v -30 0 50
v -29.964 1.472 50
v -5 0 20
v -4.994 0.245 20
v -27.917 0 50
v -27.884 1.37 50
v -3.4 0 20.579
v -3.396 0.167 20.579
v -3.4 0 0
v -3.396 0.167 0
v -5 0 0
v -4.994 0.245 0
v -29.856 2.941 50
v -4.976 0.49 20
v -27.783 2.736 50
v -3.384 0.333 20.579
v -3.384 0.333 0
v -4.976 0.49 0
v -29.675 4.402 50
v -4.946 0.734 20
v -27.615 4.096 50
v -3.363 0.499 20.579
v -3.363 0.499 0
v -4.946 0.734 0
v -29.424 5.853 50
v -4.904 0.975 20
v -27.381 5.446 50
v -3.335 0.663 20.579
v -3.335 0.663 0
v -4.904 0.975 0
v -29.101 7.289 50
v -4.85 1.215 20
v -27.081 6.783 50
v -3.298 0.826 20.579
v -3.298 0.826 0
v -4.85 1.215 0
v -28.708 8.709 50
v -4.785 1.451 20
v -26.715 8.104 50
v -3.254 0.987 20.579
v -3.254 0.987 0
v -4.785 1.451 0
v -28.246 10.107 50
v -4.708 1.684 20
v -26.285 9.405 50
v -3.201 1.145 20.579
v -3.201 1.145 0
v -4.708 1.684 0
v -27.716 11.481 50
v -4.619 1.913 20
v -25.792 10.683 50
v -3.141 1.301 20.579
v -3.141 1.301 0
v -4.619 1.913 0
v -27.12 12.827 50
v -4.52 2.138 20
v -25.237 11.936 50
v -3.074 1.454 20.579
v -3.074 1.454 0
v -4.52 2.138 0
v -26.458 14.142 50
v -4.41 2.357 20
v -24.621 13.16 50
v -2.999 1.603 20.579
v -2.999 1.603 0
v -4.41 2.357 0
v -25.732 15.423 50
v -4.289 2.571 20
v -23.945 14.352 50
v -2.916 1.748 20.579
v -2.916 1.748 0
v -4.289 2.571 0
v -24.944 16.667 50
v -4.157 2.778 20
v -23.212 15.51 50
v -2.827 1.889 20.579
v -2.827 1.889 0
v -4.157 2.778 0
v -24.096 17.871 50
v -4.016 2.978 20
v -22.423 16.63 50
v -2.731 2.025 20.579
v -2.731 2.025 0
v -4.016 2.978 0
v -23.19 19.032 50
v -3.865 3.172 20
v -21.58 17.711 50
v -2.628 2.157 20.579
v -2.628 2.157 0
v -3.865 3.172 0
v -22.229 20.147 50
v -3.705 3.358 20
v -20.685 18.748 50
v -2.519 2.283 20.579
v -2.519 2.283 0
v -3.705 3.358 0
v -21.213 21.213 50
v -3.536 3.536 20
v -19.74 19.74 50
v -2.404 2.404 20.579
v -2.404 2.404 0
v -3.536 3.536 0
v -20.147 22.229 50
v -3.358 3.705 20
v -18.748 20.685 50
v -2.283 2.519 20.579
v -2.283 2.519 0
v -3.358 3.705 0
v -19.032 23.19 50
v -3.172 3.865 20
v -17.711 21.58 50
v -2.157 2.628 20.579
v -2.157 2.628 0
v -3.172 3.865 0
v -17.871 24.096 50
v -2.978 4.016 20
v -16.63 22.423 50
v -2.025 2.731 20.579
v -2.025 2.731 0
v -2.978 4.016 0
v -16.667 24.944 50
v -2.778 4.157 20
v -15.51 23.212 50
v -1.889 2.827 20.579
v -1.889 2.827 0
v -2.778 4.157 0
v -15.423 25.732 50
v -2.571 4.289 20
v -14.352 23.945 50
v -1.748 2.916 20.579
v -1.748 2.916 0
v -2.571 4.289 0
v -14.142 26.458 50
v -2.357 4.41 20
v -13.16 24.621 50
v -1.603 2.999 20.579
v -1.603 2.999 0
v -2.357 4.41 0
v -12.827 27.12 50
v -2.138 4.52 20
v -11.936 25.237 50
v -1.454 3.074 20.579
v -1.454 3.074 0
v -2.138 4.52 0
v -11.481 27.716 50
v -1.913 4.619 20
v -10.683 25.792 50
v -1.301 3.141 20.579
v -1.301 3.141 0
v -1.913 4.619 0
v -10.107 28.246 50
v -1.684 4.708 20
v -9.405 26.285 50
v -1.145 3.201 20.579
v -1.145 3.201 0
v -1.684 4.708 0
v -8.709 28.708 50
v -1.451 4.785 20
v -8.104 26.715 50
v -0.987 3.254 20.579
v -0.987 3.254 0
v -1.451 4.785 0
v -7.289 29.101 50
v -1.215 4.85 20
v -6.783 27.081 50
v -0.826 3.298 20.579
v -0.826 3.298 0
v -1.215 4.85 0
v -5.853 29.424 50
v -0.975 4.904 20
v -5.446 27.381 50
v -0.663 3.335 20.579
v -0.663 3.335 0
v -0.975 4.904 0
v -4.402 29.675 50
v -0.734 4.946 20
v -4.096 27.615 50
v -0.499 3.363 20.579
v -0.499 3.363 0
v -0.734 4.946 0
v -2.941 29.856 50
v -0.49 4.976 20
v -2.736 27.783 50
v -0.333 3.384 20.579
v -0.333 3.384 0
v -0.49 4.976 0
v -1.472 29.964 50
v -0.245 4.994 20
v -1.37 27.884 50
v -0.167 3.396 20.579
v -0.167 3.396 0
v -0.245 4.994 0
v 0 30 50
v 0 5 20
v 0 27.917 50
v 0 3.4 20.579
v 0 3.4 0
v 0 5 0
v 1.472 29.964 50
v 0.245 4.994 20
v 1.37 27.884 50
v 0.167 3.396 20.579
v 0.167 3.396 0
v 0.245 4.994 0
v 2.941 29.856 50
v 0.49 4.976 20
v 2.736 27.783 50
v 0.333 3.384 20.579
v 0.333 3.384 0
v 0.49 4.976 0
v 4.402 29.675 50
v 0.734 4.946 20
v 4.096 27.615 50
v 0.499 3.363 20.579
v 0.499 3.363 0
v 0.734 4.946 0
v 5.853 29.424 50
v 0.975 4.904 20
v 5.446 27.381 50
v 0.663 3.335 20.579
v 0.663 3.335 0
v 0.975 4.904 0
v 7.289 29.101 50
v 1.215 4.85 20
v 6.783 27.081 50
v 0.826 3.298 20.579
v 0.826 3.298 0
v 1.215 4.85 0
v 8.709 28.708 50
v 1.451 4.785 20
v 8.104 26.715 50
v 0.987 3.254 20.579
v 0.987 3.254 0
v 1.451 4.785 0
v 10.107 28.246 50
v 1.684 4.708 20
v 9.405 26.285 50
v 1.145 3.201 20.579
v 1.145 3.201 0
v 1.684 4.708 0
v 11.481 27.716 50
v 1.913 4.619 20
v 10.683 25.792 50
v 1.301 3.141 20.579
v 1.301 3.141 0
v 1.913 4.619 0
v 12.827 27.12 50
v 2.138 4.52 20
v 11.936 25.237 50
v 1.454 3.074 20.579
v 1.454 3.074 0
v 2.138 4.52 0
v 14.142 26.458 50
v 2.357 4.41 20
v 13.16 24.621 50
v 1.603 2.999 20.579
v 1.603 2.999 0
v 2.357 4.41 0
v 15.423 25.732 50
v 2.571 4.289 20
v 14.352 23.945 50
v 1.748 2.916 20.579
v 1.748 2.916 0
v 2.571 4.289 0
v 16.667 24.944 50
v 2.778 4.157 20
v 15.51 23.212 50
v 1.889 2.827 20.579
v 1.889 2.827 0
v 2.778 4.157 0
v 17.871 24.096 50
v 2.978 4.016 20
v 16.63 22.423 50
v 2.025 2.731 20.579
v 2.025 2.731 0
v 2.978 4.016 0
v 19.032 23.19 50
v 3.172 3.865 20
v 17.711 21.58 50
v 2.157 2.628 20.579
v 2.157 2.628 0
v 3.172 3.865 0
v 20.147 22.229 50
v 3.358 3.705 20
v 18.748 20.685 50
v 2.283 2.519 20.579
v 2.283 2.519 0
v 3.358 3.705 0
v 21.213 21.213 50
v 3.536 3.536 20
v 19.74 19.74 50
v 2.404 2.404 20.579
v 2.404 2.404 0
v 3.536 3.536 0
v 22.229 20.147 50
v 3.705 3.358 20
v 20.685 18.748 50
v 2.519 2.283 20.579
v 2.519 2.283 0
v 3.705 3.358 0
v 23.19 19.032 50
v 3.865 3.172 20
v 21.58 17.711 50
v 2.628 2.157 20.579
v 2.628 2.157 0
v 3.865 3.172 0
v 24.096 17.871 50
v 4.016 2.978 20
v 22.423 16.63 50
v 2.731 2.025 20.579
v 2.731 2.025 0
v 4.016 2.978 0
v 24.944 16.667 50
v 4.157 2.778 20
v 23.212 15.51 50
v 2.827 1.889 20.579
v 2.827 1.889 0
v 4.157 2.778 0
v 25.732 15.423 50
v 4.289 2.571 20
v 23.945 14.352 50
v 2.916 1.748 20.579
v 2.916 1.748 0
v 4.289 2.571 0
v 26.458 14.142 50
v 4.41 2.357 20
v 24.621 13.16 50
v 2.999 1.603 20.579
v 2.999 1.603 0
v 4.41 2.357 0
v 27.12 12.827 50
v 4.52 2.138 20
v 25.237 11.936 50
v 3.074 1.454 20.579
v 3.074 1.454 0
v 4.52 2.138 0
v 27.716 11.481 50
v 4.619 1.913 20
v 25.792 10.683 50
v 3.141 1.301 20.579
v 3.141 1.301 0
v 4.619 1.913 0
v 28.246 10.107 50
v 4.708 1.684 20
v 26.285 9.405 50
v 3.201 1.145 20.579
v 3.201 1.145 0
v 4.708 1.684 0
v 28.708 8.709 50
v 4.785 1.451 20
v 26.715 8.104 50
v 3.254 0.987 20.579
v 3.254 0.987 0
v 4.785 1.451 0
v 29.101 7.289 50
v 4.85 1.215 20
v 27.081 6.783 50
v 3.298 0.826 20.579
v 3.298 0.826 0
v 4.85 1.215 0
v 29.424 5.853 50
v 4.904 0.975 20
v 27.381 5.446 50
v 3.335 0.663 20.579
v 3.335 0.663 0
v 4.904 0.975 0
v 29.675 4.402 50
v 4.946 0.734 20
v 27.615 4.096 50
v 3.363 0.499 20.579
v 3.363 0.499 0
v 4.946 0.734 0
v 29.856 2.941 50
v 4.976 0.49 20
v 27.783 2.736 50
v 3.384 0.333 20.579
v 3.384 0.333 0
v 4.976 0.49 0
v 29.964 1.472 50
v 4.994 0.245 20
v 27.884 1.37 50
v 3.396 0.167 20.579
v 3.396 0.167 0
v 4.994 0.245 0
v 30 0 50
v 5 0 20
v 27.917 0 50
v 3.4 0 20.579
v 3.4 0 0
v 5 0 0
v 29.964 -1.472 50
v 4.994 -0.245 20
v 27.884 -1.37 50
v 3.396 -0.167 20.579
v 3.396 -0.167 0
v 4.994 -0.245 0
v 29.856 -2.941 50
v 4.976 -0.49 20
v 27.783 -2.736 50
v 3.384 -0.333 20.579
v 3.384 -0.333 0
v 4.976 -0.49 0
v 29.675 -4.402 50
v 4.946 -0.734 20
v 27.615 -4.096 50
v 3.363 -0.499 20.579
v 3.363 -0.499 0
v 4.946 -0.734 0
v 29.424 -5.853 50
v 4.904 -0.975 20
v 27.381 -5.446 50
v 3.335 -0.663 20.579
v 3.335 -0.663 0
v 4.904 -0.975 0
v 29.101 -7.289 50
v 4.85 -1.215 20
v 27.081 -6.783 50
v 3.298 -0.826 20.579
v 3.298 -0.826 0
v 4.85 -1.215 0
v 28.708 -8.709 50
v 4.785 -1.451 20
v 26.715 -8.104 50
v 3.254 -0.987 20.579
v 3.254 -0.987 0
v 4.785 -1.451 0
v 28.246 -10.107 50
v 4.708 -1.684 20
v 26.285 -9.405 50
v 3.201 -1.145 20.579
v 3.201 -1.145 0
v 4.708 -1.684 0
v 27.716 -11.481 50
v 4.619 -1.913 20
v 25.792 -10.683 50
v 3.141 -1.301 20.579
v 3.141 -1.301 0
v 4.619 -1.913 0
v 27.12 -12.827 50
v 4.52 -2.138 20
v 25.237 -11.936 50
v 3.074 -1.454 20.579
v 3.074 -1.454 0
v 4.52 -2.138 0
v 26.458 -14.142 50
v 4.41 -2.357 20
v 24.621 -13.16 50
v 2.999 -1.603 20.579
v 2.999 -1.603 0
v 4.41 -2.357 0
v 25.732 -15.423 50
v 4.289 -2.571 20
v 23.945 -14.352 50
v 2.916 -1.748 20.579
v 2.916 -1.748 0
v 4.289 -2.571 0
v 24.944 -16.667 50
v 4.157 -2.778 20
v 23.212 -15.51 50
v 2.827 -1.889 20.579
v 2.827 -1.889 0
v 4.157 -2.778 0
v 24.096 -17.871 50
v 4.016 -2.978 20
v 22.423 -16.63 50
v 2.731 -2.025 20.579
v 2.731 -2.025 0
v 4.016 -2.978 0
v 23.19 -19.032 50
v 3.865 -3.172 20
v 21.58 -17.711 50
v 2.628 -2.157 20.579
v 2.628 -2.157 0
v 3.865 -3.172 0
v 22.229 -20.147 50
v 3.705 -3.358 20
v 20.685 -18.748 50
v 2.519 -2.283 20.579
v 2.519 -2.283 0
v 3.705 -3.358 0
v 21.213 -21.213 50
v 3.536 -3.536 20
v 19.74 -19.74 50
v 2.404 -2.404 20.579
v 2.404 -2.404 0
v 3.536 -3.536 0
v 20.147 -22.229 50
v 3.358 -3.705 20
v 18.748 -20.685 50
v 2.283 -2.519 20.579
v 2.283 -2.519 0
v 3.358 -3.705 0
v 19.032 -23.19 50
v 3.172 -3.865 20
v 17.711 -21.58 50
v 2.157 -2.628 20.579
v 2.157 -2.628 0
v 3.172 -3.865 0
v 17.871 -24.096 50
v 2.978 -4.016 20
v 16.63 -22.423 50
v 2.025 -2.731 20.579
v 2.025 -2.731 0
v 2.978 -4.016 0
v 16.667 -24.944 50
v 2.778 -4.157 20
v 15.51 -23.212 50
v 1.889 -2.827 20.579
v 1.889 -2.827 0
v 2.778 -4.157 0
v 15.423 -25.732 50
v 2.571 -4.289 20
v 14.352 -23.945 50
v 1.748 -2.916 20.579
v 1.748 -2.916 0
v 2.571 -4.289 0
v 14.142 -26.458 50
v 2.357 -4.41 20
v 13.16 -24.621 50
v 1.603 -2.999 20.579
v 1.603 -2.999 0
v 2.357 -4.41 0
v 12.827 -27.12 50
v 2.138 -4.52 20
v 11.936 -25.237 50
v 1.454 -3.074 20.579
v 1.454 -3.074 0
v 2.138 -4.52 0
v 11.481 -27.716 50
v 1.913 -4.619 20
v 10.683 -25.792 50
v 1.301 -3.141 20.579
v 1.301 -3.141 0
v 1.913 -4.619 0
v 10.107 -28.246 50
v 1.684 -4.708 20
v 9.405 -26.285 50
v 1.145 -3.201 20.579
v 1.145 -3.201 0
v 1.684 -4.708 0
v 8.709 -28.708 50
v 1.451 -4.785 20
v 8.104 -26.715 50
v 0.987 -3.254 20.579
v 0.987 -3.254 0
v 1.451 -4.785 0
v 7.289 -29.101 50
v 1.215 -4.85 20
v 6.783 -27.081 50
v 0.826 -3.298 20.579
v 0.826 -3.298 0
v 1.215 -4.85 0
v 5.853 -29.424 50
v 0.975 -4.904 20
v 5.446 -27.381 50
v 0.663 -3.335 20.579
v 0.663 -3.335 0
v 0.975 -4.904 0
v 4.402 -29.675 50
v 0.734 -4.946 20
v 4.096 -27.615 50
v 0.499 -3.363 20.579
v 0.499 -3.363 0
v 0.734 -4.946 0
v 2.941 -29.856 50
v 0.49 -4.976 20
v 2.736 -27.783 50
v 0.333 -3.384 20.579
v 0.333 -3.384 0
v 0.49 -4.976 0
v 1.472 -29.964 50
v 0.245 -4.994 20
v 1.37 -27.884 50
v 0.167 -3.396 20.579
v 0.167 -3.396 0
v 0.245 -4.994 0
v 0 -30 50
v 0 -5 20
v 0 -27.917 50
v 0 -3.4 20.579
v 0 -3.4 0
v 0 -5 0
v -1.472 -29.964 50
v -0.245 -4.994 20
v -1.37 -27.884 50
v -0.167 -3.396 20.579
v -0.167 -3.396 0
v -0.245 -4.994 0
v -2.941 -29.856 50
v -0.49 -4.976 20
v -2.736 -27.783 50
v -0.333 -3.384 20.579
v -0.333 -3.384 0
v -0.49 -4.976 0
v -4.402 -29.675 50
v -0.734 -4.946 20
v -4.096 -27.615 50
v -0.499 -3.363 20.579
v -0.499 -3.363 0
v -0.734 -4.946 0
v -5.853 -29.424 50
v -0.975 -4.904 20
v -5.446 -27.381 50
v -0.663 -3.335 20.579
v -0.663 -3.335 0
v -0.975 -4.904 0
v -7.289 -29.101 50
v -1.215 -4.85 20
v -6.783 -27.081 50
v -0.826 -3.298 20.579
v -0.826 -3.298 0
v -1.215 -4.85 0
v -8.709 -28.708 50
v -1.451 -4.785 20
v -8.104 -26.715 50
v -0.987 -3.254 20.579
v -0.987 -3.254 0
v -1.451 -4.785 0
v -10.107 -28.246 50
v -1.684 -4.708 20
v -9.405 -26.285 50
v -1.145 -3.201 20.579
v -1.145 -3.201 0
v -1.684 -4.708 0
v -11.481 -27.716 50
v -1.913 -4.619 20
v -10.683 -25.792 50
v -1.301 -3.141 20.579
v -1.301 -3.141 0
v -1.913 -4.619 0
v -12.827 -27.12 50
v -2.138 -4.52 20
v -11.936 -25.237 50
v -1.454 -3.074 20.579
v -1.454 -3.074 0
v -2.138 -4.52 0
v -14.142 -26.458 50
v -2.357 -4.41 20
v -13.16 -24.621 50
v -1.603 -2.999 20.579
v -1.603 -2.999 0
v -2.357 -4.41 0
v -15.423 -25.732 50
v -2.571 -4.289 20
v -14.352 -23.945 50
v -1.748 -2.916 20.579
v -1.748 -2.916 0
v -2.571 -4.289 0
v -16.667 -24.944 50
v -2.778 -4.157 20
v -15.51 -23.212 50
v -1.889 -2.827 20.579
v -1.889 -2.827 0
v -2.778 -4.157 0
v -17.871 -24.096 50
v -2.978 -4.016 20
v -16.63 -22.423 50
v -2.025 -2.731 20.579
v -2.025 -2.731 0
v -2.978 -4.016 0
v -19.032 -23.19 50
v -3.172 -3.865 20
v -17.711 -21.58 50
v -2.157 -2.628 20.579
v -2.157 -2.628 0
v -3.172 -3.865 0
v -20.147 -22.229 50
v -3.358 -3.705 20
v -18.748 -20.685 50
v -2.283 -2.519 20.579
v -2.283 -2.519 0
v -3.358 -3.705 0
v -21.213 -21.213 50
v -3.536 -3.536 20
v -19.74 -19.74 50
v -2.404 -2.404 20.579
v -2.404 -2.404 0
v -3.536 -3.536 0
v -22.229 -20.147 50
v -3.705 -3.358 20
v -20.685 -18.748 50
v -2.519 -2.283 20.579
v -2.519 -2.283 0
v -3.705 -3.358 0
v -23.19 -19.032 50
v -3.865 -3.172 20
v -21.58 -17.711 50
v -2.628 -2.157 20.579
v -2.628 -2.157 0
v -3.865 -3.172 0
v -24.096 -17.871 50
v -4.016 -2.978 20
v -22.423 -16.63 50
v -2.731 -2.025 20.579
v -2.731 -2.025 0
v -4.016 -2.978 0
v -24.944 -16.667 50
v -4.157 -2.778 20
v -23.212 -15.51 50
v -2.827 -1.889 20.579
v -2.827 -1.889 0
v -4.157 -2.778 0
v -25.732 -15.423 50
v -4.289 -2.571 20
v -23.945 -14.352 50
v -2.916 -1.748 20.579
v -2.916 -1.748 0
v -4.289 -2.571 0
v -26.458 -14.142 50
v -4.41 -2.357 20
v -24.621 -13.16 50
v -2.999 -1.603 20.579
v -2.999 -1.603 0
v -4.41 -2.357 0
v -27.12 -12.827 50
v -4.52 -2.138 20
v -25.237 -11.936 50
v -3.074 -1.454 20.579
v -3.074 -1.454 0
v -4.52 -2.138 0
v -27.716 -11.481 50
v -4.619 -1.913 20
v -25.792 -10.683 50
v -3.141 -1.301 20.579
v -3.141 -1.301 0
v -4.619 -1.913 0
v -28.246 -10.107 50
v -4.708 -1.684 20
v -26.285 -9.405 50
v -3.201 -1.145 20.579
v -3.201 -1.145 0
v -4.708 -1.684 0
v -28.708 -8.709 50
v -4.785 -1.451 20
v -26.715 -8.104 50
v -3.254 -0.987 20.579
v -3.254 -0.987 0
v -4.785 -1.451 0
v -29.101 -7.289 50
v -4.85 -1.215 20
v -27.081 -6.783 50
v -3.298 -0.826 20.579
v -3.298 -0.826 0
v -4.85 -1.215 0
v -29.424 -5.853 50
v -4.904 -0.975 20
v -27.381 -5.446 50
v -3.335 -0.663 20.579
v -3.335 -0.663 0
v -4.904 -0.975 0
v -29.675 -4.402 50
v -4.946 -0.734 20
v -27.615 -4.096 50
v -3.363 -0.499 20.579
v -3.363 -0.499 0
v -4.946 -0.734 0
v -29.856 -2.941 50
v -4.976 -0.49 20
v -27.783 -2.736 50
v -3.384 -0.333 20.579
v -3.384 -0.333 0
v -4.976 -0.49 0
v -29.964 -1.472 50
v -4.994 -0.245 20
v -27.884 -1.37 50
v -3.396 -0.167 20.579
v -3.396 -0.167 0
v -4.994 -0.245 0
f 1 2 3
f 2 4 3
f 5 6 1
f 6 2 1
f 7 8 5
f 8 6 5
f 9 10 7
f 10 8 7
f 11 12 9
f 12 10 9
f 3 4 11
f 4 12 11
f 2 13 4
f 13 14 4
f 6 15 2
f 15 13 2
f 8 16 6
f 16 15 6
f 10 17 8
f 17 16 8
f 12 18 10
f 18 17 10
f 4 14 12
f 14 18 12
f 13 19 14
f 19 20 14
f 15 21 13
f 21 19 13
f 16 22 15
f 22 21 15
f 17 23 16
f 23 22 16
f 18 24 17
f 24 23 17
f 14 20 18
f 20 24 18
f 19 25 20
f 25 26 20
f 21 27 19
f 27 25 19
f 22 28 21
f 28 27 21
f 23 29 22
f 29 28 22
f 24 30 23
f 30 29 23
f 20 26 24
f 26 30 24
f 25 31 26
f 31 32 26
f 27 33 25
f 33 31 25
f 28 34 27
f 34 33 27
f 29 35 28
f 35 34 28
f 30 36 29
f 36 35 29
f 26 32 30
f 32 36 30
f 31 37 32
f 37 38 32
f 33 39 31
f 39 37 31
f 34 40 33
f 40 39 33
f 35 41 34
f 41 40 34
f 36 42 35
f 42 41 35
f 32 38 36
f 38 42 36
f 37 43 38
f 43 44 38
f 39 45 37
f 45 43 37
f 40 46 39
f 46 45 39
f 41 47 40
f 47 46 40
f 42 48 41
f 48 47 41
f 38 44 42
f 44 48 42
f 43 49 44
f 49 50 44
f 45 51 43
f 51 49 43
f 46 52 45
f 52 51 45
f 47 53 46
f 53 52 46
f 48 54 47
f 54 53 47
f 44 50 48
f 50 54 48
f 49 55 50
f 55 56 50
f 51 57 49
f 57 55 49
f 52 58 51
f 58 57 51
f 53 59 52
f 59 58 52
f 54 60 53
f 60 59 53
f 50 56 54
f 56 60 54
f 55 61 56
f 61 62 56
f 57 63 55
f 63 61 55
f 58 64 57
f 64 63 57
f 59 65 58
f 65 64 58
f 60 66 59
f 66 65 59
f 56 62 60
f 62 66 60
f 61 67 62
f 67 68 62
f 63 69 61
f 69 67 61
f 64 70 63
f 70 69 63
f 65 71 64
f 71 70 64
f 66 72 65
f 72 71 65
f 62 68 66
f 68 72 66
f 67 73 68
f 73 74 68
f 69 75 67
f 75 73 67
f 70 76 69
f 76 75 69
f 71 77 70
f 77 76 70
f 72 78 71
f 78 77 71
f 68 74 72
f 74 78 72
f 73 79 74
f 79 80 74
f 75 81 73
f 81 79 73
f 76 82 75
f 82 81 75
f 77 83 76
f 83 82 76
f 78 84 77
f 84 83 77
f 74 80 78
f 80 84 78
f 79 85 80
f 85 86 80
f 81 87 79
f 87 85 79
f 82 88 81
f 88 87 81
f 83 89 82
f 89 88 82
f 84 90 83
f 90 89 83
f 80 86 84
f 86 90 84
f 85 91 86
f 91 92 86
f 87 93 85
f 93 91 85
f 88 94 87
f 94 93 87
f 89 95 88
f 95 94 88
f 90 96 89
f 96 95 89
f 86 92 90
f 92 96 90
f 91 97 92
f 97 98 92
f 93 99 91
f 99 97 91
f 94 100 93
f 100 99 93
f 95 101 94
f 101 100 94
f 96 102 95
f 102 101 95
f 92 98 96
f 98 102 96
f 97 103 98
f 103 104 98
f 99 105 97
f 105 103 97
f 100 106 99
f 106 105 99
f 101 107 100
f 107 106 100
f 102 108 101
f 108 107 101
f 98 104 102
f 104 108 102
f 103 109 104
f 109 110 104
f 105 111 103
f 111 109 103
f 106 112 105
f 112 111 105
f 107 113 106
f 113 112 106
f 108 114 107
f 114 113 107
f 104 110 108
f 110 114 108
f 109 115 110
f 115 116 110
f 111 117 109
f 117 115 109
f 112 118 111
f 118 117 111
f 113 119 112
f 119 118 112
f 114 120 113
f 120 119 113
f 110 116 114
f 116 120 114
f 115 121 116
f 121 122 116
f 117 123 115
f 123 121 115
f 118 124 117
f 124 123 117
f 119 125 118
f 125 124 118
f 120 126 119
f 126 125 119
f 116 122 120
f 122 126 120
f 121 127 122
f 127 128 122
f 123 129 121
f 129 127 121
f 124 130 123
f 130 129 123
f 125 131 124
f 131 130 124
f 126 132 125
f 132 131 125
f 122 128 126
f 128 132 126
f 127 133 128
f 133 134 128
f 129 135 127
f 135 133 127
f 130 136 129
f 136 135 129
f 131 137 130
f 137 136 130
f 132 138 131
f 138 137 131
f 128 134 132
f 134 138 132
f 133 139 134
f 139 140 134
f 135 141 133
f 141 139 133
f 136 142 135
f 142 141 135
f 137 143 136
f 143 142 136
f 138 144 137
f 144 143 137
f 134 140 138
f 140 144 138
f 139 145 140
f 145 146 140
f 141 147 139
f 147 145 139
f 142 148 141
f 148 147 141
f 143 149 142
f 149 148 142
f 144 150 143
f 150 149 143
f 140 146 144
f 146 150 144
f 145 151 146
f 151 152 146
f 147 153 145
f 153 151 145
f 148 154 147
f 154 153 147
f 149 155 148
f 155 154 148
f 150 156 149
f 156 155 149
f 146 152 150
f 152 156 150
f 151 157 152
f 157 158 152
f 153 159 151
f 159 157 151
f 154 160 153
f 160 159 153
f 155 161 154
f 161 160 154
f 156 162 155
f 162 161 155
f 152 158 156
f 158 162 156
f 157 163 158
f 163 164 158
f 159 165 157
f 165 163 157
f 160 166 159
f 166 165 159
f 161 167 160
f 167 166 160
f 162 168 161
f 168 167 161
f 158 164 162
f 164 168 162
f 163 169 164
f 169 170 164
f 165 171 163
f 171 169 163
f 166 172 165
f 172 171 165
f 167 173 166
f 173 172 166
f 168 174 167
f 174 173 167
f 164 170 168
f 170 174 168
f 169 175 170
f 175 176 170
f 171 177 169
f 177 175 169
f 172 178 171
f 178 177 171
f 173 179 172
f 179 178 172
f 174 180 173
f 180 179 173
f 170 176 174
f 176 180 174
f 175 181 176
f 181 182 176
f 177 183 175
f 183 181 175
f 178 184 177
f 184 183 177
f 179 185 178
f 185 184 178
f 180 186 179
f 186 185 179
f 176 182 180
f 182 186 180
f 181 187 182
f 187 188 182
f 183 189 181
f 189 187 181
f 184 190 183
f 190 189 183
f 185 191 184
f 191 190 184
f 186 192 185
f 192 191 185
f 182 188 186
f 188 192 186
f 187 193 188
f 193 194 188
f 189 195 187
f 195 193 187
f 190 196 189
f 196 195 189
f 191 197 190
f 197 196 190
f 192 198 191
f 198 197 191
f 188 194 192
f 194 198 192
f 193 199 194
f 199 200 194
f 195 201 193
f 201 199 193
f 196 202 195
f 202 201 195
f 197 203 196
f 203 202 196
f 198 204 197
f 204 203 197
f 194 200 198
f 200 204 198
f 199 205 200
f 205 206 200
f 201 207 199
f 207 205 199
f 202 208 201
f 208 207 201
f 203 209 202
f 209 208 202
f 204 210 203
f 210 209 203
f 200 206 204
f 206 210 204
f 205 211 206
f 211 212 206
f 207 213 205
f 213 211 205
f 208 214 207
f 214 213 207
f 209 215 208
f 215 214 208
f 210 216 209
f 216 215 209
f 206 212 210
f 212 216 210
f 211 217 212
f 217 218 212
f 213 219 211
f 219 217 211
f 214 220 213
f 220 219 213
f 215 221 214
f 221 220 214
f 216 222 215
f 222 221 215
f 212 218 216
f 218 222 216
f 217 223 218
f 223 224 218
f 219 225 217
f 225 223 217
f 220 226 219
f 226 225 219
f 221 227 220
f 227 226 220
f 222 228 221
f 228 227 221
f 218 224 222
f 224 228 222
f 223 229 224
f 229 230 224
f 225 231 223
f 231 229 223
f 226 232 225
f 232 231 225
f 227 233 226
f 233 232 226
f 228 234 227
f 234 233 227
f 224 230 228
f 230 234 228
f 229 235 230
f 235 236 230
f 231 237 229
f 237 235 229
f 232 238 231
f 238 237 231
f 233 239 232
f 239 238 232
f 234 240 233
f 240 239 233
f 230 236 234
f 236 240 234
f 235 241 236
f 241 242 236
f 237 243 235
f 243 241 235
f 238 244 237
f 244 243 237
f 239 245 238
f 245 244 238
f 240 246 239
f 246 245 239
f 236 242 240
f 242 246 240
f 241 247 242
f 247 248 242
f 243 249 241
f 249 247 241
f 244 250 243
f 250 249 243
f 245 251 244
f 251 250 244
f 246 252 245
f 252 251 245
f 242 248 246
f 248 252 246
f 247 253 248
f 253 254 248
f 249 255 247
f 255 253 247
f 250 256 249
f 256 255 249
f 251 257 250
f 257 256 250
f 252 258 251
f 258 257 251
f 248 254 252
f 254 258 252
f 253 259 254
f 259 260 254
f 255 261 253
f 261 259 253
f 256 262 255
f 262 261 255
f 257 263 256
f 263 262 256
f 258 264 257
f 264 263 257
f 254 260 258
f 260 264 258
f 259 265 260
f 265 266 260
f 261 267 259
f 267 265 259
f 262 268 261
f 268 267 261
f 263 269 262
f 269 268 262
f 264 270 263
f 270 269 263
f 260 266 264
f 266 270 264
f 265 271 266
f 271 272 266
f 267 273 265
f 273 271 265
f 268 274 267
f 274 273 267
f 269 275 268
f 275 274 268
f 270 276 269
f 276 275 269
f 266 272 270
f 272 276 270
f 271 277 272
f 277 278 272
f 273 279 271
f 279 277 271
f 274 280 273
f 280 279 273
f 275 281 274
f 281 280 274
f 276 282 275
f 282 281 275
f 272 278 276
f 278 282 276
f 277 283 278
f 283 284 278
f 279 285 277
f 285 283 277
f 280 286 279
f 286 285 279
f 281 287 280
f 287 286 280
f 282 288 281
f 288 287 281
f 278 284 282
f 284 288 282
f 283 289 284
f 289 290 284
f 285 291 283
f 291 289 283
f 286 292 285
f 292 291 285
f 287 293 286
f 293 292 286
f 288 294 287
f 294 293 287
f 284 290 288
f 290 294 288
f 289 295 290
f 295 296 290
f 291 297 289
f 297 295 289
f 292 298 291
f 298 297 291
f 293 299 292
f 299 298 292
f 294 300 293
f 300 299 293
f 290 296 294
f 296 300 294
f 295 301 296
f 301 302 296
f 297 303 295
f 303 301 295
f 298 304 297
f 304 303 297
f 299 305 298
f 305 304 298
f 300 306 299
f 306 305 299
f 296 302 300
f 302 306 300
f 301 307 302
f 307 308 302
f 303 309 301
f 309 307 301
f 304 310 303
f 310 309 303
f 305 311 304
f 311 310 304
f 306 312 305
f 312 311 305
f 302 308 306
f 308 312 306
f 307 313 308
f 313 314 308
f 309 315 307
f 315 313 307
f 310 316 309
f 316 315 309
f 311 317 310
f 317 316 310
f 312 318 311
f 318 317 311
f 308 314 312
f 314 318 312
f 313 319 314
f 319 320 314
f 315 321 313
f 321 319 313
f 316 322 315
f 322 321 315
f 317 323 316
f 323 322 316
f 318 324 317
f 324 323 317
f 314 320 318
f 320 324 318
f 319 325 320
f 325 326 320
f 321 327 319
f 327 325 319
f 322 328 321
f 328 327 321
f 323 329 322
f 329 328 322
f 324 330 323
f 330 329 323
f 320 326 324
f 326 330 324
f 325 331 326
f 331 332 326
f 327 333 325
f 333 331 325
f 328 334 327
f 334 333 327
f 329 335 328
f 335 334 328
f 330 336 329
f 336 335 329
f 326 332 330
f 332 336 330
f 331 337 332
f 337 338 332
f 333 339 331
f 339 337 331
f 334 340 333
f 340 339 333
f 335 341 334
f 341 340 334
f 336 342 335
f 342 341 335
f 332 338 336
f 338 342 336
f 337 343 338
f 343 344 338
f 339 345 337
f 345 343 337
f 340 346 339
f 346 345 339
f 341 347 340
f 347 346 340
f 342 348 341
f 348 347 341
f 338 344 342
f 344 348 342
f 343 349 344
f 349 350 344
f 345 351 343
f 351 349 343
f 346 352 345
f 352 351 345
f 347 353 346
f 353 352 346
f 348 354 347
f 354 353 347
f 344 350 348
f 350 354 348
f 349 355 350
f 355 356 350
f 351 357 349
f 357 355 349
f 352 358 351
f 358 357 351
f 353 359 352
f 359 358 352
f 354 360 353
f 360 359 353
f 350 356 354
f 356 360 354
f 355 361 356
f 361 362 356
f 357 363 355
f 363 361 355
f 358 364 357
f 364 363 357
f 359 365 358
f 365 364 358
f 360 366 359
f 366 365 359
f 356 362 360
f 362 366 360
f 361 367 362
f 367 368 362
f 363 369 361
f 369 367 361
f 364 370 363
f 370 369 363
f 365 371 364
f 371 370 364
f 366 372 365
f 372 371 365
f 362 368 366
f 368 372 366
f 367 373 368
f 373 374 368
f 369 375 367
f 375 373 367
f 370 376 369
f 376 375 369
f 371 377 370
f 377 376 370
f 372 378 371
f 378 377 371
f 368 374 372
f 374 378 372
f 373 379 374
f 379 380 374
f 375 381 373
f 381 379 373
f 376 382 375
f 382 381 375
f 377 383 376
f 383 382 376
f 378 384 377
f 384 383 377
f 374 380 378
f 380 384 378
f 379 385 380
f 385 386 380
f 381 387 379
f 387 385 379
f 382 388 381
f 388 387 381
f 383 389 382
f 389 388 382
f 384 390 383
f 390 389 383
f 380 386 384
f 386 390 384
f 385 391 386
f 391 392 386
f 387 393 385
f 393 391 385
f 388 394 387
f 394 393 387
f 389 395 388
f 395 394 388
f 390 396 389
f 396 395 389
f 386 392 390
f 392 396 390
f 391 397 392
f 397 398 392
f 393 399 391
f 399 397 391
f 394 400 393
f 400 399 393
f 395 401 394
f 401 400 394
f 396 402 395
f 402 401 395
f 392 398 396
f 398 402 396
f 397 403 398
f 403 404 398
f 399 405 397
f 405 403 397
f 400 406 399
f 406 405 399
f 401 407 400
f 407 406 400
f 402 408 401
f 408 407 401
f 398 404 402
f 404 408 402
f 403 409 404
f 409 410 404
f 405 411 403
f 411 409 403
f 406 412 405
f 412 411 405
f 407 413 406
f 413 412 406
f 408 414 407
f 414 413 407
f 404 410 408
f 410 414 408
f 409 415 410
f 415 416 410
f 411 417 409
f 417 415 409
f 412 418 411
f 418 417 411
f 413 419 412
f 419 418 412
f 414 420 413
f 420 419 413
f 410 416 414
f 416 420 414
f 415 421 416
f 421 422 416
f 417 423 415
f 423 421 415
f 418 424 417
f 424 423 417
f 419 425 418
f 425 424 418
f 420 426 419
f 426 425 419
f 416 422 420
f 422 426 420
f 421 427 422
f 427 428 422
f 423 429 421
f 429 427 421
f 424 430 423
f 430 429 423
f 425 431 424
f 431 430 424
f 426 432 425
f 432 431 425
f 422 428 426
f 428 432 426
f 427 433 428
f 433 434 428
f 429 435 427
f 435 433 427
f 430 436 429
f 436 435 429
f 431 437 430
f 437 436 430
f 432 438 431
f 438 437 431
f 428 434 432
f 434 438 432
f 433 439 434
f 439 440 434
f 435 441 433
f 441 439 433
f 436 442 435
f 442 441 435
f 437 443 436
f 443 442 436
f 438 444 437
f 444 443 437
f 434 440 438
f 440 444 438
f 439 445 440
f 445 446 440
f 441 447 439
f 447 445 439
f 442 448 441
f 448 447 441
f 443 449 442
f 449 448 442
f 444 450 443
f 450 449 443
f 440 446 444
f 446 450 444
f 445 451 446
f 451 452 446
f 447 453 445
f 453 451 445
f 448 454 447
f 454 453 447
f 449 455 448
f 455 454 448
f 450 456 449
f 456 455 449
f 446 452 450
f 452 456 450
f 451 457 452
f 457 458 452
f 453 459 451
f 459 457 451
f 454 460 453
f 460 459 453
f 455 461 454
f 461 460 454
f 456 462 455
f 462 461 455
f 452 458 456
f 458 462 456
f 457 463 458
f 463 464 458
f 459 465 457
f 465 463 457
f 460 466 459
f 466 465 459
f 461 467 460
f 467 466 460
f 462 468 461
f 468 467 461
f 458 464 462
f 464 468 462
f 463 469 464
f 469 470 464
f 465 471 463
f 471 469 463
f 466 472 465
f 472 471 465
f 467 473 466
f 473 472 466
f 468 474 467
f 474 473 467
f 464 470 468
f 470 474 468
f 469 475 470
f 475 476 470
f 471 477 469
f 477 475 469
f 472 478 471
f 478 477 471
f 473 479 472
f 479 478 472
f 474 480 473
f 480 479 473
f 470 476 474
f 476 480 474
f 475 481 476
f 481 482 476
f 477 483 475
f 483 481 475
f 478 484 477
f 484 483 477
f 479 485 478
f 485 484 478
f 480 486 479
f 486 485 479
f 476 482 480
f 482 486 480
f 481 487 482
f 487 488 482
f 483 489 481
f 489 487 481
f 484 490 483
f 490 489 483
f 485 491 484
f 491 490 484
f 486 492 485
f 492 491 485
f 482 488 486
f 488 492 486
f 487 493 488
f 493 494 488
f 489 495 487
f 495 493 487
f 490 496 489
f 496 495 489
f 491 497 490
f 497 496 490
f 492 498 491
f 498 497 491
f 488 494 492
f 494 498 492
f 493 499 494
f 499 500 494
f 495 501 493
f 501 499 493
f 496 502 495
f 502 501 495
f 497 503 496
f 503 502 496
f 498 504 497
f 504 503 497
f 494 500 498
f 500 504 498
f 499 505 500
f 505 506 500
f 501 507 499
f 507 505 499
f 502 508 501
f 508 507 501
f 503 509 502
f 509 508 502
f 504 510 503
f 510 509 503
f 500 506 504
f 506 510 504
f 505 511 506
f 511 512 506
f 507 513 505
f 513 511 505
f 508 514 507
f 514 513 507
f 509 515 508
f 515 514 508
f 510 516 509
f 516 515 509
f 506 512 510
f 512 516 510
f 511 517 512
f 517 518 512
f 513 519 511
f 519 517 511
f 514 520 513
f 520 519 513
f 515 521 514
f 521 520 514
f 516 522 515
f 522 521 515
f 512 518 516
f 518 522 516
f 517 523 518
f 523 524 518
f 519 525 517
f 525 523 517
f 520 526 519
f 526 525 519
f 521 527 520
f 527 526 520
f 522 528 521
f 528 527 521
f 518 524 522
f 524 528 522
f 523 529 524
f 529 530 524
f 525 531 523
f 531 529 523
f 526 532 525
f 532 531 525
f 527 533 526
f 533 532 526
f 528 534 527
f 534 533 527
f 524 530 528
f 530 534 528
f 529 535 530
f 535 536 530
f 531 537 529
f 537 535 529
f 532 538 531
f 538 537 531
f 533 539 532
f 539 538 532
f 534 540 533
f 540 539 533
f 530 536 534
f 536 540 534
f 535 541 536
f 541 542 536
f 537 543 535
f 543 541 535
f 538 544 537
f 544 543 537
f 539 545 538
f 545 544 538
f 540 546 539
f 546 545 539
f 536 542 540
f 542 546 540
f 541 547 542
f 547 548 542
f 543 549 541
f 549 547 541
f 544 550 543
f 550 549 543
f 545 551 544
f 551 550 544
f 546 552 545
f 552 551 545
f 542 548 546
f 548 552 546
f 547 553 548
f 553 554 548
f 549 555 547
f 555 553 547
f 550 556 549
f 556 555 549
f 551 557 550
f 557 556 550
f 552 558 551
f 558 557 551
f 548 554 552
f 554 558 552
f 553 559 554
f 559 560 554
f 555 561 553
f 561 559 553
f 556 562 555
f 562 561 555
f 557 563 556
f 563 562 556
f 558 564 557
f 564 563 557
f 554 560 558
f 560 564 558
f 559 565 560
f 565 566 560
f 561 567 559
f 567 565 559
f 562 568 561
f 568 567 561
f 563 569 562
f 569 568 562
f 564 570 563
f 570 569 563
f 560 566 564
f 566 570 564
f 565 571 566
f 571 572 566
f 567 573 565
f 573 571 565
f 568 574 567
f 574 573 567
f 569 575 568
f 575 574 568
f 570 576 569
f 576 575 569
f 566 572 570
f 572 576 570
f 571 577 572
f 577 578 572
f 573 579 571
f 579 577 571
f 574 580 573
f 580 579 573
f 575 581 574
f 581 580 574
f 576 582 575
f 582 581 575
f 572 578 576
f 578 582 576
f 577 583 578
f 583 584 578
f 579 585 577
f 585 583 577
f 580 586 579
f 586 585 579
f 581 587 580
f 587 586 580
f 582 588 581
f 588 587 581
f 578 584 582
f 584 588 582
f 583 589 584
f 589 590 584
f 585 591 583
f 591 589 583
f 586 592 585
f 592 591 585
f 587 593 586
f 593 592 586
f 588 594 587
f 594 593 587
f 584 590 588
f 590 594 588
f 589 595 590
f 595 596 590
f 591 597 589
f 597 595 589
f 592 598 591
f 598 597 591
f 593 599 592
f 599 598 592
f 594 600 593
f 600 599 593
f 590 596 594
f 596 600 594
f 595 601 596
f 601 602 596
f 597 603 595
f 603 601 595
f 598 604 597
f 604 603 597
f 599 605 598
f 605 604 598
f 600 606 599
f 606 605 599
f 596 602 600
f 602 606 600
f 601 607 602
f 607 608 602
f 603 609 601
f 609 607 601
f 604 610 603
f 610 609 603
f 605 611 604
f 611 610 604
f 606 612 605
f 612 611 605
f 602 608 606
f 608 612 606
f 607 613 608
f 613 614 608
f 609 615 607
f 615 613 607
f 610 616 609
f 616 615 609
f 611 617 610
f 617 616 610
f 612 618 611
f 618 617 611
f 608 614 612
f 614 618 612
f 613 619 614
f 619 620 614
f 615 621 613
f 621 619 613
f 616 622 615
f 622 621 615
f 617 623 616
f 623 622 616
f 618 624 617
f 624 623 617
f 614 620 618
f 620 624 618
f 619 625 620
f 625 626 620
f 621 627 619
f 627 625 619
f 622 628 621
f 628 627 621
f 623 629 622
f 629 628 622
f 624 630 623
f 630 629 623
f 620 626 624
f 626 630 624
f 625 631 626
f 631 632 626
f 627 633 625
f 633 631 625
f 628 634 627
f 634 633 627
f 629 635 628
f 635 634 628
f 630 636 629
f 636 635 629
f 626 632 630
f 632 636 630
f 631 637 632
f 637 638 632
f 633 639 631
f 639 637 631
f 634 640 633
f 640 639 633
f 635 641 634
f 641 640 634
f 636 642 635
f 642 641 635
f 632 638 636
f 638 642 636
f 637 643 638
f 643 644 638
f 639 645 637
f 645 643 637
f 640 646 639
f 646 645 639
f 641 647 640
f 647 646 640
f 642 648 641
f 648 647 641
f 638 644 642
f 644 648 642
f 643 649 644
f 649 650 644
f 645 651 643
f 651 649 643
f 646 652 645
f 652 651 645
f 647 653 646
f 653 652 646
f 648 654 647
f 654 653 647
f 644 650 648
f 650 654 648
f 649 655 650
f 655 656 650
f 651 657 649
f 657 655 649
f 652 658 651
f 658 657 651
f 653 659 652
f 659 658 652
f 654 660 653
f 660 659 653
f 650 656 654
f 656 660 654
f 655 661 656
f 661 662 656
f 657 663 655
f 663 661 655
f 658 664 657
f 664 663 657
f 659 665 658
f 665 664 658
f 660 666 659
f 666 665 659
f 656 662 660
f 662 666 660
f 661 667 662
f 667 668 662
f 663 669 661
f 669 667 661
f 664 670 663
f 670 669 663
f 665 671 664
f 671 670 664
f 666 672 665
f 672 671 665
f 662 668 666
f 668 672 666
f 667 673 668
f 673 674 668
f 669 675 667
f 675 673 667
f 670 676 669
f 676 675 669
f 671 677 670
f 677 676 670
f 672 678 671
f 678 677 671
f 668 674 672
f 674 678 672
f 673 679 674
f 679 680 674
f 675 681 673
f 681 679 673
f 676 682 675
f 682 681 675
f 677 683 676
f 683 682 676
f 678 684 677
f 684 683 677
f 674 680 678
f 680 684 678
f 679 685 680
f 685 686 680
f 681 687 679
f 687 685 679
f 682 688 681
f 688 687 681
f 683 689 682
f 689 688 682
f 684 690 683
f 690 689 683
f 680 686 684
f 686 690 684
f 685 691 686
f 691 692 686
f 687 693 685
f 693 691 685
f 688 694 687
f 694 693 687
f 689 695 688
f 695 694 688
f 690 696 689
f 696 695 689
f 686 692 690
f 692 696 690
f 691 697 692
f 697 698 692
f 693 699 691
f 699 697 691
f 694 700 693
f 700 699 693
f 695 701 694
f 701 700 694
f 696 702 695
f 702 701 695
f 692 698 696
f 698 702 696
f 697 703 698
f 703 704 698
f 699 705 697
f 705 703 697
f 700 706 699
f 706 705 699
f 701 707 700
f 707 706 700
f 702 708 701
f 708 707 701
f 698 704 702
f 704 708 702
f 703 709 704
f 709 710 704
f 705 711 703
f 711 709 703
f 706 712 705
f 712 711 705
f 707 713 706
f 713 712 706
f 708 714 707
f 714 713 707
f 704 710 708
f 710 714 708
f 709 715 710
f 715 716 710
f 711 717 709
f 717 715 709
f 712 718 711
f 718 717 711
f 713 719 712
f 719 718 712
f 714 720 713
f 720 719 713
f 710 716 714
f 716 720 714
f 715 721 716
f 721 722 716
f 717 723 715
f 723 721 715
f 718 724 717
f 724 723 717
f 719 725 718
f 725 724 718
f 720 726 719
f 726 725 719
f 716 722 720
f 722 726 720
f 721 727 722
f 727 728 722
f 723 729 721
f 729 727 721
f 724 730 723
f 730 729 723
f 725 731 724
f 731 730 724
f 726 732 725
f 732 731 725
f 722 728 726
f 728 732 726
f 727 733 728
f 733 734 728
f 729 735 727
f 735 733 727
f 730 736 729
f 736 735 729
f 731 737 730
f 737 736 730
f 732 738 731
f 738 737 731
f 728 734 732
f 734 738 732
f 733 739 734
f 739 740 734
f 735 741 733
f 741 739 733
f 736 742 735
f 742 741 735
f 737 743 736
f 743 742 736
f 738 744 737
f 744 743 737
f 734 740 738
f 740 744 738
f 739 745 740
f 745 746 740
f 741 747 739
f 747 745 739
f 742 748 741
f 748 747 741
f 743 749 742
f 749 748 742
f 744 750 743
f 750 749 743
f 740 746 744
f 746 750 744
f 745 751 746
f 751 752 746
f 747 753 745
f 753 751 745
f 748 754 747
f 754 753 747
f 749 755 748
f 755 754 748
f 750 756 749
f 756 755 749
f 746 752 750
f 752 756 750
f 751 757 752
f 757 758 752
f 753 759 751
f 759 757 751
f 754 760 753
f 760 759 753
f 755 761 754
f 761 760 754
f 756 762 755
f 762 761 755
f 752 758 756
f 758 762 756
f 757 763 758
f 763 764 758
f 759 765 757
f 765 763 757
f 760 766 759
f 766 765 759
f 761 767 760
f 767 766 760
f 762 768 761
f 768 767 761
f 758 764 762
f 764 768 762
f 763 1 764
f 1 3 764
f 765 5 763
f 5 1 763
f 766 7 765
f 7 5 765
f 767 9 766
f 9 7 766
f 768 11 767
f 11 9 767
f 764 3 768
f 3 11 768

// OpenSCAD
// Small lab funnel, printed upright: spout at the bottom, wide opening at the top
// Units: mm

$fn = 128;                         // smoothness of round surfaces

// ---------------- Parameters ----------------
spout_od      = 10;                // spout outer diameter
spout_h       = 20;                // spout height (z = 0 .. 20)
rim_od        = 60;                // cone outer diameter at the rim
top_z         = 50;                // rim height
wall          = 1.6;               // wall thickness (measured perpendicular to the wall)

// ---------------- Derived ----------------
spout_r_out   = spout_od / 2;                      // 5
spout_r_in    = spout_r_out - wall;                // 3.4  (bore 6.8 mm)
rim_r_out     = rim_od / 2;                        // 30
cone_h        = top_z - spout_h;                   // 30
cone_k        = (rim_r_out - spout_r_out) / cone_h; // radial growth per mm of height
cone_dr       = wall * sqrt(1 + cone_k * cone_k);  // horizontal offset that gives 1.6 mm normal wall
rim_r_in      = rim_r_out - cone_dr;               // inner radius at the rim
// height where the inner cone surface meets the spout bore
join_z        = spout_h + (cone_dr - wall) / cone_k;

// ---------------- Model ----------------
// The half cross-section is revolved around Z; this gives a hollow part
// that is open at the top and bottom, with a constant wall thickness.
rotate_extrude(convexity = 4)
    polygon(points = [
        [spout_r_in,  0],          // bottom of the bore
        [spout_r_out, 0],          // bottom outer edge of the spout
        [spout_r_out, spout_h],    // spout/cone outer transition
        [rim_r_out,   top_z],      // outer rim
        [rim_r_in,    top_z],      // inner rim (flat top lip)
        [spout_r_in,  join_z]      // inner cone meets the bore
    ]);
